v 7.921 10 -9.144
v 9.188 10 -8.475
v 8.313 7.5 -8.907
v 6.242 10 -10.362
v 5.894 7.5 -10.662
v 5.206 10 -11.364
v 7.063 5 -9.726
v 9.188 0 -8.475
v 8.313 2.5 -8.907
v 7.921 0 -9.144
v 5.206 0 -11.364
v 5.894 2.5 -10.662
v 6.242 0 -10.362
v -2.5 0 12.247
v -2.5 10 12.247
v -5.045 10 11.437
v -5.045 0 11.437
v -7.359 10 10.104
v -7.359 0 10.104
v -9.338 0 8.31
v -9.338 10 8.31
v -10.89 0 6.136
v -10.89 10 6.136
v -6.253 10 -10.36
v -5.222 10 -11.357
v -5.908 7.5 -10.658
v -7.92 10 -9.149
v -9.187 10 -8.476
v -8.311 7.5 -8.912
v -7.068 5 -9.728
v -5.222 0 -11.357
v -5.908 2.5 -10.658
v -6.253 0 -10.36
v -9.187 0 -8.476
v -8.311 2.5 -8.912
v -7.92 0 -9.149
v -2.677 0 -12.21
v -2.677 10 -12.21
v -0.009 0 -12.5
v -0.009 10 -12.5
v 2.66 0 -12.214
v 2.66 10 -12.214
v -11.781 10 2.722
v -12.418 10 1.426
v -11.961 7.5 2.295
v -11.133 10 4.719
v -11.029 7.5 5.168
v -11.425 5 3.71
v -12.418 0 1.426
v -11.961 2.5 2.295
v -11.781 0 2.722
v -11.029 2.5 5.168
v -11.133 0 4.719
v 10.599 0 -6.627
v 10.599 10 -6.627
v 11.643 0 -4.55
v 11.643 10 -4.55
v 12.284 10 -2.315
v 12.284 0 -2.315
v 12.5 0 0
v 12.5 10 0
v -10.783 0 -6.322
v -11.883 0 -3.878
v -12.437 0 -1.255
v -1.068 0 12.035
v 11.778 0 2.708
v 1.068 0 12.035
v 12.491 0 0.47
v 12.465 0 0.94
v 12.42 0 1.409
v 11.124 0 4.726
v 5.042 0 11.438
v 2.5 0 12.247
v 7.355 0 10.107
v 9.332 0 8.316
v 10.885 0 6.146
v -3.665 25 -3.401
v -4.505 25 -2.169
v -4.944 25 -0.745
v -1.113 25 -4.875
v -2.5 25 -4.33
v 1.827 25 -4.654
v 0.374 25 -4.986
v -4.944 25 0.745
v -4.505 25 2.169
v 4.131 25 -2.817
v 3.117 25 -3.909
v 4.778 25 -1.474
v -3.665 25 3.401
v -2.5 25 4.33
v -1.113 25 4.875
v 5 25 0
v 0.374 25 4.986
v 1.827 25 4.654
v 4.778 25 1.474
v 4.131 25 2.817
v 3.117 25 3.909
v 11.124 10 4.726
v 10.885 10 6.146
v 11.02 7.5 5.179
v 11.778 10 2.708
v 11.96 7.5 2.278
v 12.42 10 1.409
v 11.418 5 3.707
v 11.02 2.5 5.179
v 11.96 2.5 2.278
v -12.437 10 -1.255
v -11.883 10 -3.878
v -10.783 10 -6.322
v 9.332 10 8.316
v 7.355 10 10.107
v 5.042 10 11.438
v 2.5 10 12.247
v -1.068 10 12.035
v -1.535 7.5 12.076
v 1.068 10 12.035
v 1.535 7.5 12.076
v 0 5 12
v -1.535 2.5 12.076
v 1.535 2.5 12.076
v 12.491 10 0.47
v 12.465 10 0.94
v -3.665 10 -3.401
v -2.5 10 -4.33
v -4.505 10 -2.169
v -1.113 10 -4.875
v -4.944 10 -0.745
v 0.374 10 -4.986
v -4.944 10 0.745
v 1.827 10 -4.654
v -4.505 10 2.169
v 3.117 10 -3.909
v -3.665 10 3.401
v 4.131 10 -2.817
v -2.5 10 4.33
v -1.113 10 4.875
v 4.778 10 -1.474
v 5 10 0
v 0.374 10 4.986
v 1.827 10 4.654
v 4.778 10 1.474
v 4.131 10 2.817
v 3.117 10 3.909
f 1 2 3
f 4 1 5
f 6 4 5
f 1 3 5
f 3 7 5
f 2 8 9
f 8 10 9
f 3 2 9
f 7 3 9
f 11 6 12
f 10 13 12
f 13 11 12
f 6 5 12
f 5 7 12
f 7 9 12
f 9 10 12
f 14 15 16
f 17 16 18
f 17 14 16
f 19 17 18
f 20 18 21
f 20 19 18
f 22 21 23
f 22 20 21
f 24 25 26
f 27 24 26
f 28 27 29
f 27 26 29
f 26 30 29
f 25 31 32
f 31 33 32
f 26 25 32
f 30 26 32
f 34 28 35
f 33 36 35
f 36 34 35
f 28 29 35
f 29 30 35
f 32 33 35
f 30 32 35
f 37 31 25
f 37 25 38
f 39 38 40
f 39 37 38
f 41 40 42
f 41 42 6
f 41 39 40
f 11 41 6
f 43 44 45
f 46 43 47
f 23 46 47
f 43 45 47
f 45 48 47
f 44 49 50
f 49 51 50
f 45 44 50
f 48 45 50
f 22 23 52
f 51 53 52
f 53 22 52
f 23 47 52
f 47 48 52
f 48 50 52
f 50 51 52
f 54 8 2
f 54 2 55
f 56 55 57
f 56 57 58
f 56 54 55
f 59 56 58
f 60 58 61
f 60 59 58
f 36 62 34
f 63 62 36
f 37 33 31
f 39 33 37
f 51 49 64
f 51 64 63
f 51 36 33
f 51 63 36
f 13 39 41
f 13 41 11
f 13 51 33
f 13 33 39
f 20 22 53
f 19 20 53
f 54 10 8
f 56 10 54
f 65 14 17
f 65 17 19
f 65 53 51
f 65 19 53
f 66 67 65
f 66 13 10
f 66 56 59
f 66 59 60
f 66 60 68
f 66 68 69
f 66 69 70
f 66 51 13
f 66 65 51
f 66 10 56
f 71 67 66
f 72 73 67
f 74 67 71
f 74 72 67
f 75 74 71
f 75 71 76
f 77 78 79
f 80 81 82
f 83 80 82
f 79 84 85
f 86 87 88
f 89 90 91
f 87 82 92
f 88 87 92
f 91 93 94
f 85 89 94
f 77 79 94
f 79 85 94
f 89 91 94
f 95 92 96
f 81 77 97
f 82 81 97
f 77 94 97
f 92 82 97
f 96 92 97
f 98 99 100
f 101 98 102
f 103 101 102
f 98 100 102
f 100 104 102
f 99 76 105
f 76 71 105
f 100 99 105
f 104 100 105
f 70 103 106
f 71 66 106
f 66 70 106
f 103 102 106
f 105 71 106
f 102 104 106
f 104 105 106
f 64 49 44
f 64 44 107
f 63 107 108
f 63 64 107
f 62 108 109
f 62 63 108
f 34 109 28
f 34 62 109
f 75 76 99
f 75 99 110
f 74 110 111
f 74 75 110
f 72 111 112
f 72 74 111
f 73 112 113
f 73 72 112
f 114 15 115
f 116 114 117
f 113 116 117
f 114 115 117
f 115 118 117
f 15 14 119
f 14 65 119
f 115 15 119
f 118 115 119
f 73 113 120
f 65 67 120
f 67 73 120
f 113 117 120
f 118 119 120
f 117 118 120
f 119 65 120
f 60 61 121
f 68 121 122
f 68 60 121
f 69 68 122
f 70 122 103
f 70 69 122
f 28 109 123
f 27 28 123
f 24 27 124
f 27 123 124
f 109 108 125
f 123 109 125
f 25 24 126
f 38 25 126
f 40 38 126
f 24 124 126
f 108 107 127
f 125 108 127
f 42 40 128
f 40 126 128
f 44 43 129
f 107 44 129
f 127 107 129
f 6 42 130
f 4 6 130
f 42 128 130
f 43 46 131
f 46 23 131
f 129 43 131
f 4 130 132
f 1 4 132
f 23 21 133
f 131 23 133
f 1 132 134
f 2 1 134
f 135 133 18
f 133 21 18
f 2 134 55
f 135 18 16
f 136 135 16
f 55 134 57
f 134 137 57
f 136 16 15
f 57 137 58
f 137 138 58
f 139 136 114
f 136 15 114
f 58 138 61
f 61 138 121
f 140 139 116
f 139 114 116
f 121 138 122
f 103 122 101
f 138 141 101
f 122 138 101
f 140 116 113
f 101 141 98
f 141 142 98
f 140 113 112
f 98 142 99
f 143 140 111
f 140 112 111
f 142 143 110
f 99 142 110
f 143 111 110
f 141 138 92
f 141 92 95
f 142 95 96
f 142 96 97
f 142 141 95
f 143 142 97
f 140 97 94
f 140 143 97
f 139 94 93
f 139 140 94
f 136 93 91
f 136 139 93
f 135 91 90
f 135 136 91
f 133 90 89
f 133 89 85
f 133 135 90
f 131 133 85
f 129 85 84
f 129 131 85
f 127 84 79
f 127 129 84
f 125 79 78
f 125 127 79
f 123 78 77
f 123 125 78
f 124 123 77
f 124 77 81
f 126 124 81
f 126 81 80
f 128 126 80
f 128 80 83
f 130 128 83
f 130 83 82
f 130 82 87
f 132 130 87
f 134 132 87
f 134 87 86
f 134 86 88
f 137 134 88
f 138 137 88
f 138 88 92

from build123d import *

# Parameters (mm, degrees)
F0_R     = 5
F1_DEPTH = 25
F2_DEPTH = 10


with BuildPart() as f1:
    # F0 (on Front) → F1 (new body)
    with BuildSketch(Plane.XZ):
        Circle(F0_R)
    extrude(amount=-F1_DEPTH)

    # F0 (on Front) → F2 (join)
    with BuildSketch(Plane.XZ):
        with BuildLine():
            ThreePointArc((10.8845513989, 6.1462623475), (7.3547721112, 10.1072907939), (2.5, 12.2474487139))
            add(Edge.make_bspline(
                [(-2.5, 12.2474487139), (0, 11.5101020514), (2.5, 12.2474487139)],
                knots=[0.5295008084, 0.5295008084, 0.5295008084, 2.6120918452, 2.6120918452, 2.6120918452], degree=2, weights=[1, 0.5051025722, 1]))
            ThreePointArc((-2.5, 12.2474487139), (-7.3594746101, 10.1038672529), (-10.8902668496, 6.1361297203))
            add(Edge.make_bspline(
                [(-12.4183614967, 1.4262880979), (-10.9820454119, 3.5733899362), (-10.8902668496, 6.1361297203)],
                knots=[0.5483081022, 0.5483081022, 0.5483081022, 2.5982377345, 2.5982377345, 2.5982377345], degree=2, weights=[1, 0.5191289586, 1]))
            ThreePointArc((-12.4183614967, 1.4262880979), (-11.883327852, -3.8776950837), (-9.1869736579, -8.4764093228))
            add(Edge.make_bspline(
                [(-5.2222037532, -11.35687404), (-6.8105963999, -9.3736670378), (-9.1869736579, -8.4764093228)],
                knots=[0.5626274917, 0.5626274917, 0.5626274917, 2.5791740982, 2.5791740982, 2.5791740982], degree=2, weights=[1, 0.5333221495, 1]))
            ThreePointArc((-5.2222037532, -11.35687404), (-0.008685173, -12.4999969827), (5.2064168882, -11.3641199917))
            add(Edge.make_bspline(
                [(9.1879155932, -8.4753883128), (6.8082361023, -9.3588262471), (5.2064168882, -11.3641199917)],
                knots=[0.5527221385, 0.5527221385, 0.5527221385, 2.5812548422, 2.5812548422, 2.5812548422], degree=2, weights=[1, 0.5282430094, 1]))
            ThreePointArc((9.1879155932, -8.4753883128), (11.6425715569, -4.5497832413), (12.5, 0))
            ThreePointArc((12.5, 0), (12.4800818706, 0.7053768519), (12.4203909595, 1.4085057378))
            add(Edge.make_bspline(
                [(10.8845513989, 6.1462623475), (10.9593557736, 3.5694882441), (12.4203909595, 1.4085057378)],
                knots=[0.53219448, 0.53219448, 0.53219448, 2.6015416859, 2.6015416859, 2.6015416859], degree=2, weights=[1, 0.510806562, 1]))
        make_face()
        Circle(F0_R, mode=Mode.SUBTRACT)
    extrude(amount=-F2_DEPTH)


solid = f1.part
